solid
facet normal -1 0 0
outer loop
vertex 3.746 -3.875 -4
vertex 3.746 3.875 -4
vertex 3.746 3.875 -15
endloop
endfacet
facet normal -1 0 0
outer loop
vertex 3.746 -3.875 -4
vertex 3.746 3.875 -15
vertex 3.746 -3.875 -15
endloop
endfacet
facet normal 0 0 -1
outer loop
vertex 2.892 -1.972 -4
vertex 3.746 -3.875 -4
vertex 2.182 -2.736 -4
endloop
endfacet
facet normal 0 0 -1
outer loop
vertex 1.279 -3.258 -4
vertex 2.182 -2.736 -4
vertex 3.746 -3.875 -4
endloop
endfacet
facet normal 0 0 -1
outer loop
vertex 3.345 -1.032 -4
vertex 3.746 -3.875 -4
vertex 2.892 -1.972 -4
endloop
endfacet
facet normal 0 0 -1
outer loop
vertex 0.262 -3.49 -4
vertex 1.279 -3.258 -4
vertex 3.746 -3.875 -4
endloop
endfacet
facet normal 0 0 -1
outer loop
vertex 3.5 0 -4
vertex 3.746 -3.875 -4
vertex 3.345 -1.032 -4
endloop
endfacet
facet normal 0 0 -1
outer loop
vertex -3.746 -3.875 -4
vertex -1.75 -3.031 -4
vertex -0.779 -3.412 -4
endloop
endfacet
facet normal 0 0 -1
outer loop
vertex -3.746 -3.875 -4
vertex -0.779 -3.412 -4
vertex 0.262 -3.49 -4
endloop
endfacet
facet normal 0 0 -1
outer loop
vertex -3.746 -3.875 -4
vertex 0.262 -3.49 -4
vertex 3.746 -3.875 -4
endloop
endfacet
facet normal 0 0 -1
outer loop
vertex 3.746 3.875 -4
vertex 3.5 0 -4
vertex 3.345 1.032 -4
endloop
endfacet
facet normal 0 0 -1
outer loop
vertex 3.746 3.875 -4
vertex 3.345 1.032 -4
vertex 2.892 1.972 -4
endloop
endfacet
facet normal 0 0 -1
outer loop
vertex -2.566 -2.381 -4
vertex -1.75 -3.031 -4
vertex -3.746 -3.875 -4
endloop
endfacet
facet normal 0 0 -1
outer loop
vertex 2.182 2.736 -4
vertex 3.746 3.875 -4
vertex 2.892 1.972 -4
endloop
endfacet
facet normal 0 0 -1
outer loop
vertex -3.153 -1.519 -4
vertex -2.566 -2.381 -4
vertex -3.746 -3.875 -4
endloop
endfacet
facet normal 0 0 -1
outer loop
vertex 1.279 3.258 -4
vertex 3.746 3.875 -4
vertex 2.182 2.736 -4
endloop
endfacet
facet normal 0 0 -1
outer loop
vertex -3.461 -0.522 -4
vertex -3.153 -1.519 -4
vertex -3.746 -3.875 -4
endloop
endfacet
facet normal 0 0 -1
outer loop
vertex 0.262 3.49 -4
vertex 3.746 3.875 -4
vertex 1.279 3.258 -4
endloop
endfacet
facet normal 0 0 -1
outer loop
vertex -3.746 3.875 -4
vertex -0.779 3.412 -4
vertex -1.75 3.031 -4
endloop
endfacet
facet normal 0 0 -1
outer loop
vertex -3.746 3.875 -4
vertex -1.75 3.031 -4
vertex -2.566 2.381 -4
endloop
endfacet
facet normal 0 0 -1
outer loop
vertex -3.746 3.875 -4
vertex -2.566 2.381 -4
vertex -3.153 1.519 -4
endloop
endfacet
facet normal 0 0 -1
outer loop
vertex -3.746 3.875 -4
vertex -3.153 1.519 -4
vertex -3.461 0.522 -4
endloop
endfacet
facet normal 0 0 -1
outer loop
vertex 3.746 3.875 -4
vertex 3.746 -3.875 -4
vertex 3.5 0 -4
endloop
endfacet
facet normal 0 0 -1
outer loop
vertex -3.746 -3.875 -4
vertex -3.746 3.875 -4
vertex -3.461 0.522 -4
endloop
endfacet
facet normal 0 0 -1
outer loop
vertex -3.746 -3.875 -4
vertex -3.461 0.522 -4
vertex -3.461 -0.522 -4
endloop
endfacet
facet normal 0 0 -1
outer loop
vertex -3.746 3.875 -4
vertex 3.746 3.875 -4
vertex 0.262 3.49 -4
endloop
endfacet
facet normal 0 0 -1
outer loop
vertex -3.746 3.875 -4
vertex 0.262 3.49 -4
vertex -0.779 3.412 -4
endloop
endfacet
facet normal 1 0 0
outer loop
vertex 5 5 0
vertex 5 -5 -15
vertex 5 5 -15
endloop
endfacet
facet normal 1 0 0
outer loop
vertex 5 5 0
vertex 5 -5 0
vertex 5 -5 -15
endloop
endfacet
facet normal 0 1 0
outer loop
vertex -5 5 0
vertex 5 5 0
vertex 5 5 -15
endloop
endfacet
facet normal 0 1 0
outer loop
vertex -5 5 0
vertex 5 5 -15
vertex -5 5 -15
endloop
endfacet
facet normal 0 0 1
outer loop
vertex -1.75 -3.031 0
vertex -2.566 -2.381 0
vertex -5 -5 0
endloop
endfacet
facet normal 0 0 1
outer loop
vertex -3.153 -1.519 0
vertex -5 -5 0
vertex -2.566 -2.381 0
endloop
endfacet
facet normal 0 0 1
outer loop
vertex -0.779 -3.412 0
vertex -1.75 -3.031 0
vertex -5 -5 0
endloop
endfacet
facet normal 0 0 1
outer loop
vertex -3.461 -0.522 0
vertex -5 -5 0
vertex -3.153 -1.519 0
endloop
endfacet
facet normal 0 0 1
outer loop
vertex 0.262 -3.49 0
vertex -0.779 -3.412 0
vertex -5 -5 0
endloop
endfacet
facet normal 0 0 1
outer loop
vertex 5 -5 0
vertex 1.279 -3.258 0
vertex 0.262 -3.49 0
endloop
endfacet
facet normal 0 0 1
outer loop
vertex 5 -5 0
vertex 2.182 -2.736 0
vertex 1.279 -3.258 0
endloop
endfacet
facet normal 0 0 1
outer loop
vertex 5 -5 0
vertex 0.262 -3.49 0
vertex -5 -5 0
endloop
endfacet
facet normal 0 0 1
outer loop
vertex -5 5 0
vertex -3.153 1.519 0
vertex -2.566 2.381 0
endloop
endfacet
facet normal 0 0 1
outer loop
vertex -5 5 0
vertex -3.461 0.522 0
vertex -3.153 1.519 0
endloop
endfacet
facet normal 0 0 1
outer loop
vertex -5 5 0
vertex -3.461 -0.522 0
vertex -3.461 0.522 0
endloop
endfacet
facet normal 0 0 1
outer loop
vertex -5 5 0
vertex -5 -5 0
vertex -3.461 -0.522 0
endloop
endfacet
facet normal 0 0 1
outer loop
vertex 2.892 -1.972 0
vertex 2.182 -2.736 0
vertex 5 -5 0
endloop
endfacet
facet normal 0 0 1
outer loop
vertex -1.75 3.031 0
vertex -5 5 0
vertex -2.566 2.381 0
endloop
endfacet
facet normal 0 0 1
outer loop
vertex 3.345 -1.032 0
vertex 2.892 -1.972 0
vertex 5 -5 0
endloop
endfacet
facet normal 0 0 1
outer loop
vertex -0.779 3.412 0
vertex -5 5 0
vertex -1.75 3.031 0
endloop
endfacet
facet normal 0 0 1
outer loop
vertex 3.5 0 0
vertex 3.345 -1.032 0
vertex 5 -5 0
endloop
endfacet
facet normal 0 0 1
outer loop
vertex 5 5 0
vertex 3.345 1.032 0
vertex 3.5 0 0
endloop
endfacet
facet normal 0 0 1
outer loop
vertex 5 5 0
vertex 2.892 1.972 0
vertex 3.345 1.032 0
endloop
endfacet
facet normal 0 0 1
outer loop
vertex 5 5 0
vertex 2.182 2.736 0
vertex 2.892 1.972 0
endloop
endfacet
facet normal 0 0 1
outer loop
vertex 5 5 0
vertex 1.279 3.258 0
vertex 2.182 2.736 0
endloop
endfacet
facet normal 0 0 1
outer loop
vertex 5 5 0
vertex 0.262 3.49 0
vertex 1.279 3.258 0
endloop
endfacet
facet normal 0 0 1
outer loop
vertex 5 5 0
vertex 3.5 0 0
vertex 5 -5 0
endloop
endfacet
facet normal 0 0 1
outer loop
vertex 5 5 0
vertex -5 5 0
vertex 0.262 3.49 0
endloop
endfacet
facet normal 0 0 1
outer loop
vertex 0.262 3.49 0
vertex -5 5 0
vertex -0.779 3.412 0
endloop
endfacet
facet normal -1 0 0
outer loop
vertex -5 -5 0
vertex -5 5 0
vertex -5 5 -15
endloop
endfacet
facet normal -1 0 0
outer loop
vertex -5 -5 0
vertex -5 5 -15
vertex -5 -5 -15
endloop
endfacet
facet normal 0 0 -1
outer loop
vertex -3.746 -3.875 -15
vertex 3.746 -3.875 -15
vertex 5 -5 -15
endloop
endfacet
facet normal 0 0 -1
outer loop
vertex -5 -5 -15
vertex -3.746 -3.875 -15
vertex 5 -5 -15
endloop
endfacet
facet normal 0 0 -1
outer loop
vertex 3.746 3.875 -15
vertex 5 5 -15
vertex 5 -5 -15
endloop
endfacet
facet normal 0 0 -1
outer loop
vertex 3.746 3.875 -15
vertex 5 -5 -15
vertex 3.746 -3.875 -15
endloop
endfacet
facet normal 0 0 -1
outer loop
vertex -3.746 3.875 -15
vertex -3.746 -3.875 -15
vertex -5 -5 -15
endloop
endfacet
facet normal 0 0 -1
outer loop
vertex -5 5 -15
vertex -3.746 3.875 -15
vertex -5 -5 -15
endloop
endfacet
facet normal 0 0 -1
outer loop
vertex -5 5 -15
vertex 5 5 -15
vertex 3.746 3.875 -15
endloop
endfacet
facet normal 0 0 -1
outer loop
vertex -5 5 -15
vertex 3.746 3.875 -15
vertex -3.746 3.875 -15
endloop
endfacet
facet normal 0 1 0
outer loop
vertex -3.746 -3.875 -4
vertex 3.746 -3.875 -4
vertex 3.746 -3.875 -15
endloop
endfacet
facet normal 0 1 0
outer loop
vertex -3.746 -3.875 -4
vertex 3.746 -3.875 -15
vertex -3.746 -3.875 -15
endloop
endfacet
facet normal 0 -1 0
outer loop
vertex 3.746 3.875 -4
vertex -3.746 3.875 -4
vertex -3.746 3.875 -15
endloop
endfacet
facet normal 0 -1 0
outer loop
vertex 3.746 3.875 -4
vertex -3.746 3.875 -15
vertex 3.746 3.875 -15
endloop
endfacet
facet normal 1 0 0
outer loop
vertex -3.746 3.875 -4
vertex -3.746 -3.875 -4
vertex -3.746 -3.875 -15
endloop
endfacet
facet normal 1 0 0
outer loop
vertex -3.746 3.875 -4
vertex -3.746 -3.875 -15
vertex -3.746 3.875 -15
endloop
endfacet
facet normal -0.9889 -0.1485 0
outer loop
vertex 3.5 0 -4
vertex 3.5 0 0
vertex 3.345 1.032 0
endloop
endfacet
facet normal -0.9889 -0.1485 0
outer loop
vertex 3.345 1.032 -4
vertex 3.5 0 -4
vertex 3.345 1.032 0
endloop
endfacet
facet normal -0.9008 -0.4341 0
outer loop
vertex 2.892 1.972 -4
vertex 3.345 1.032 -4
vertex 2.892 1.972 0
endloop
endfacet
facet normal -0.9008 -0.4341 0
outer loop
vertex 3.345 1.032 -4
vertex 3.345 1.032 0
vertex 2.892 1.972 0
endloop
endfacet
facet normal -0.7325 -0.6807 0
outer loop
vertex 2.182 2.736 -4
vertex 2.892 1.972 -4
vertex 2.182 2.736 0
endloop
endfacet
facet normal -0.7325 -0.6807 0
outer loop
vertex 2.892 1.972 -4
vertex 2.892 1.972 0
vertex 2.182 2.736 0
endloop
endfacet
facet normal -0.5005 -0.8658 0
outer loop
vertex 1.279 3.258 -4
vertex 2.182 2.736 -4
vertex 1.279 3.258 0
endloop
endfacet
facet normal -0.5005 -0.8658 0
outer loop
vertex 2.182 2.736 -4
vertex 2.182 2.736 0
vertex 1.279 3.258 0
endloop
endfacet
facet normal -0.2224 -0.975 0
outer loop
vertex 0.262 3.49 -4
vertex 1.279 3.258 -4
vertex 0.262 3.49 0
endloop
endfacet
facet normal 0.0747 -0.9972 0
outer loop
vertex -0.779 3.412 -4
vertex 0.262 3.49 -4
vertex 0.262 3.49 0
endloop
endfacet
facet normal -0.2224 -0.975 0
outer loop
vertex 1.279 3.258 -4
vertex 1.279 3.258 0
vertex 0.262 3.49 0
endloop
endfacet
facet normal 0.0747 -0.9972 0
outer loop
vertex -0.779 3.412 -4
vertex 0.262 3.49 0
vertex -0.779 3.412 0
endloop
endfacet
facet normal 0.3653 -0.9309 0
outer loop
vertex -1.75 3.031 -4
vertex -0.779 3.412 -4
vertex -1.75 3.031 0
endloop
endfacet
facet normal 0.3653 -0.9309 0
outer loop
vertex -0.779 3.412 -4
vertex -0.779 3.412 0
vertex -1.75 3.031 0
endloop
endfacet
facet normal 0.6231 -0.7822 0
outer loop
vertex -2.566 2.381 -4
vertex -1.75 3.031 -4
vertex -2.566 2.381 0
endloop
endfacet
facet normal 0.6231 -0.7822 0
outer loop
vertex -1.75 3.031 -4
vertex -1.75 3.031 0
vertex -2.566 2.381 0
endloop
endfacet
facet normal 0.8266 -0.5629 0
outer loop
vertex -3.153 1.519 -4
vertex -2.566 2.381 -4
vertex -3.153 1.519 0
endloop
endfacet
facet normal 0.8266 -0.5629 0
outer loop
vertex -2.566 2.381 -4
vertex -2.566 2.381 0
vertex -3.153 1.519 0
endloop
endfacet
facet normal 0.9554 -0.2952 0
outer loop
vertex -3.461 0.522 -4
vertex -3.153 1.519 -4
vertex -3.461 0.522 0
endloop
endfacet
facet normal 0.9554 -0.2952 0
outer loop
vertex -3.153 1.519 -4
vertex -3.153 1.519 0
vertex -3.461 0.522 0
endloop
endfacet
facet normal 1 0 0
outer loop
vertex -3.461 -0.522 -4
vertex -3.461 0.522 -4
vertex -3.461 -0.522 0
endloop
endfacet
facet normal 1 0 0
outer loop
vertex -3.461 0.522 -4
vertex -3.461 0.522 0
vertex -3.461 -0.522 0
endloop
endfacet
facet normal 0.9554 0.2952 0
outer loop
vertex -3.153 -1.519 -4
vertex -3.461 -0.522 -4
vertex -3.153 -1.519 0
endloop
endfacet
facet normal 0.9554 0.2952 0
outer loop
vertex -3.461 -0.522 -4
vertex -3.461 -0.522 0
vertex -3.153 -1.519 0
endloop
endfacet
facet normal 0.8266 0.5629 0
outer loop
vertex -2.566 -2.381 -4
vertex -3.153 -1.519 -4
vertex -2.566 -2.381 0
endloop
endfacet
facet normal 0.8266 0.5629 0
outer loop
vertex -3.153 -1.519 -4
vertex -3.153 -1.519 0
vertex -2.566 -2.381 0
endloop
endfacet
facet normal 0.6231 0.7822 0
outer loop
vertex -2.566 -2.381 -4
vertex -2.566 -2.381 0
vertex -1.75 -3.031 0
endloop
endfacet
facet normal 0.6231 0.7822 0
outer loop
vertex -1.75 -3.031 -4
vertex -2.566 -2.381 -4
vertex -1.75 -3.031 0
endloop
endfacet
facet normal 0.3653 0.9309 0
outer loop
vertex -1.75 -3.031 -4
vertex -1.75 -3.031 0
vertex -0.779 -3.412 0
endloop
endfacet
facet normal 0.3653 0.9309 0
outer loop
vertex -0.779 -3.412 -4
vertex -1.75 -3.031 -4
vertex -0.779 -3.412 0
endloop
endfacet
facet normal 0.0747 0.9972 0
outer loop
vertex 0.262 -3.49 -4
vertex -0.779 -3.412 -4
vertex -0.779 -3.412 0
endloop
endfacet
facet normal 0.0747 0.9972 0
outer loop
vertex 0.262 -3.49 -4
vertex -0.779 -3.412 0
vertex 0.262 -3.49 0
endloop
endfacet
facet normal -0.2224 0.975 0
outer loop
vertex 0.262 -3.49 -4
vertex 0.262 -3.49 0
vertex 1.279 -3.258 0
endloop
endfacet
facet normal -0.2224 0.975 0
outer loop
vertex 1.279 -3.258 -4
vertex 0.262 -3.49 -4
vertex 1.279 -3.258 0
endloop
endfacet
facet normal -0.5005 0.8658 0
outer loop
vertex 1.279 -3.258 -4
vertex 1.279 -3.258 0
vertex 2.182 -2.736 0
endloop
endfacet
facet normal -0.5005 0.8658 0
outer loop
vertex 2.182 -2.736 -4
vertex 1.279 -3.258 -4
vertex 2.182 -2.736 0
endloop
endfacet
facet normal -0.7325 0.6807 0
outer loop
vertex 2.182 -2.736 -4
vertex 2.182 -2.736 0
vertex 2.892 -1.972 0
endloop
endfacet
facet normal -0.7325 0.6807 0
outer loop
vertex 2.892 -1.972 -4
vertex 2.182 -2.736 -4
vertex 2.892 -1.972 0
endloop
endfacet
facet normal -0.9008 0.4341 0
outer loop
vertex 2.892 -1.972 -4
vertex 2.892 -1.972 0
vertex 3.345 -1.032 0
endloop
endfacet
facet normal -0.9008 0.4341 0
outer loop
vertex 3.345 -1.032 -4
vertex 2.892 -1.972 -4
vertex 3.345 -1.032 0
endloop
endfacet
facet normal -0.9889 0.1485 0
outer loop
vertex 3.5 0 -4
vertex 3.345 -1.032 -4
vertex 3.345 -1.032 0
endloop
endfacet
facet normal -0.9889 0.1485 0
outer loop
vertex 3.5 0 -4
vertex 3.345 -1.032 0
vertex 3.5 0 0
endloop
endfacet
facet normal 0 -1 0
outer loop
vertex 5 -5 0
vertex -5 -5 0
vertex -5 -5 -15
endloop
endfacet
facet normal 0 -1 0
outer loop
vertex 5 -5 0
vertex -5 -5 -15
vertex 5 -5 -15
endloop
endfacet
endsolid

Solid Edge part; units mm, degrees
sketch "Sketch1" plane through (0, 0, 0) normal (0, 0, 1) x (1, 0, 0)
  line L0 (5, -5) -> (5, 5)
  line L1 (5, 5) -> (-5, 5)
  line L2 (-5, 5) -> (-5, -5)
  line L3 (-5, -5) -> (5, -5)
extrude "Protrusion1" add sketch "Sketch1" against normal blind 8
sketch "Sketch2" plane through (0, 0, 0) normal (0, 0, 1) x (1, 0, 0)
  circle A0 centre (0, 0) radius 3.5
extrude "ExtrudedCutout_1" cut sketch "Sketch2" along normal mid plane 71.7561
sketch "Sketch3" plane through (0, 0, -8) normal (0, 0, -1) x (1, 0, 0)
  line L0 (5, 5) -> (-5, 5)
  line L1 (-5, 5) -> (-5, -5)
  line L2 (-5, -5) -> (5, -5)
  line L3 (5, -5) -> (5, 5)
  line L4 (-3.7458, 3.875) -> (-3.7458, -3.875)
  line L5 (-3.7458, -3.875) -> (3.7458, -3.875)
  line L6 (3.7458, -3.875) -> (3.7458, 3.875)
  line L7 (3.7458, 3.875) -> (-3.7458, 3.875)
extrude "ExtrudedProtrusion_4" add sketch "Sketch3" along normal blind 7
sketch "Sketch4" plane through (0, 0, -8) normal (0, 0, -1) x (1, 0, 0)
  line L0 (3.7458, 3.875) -> (-3.7458, 3.875)
  line L1 (-3.7458, 3.875) -> (-3.7458, -3.875)
  line L2 (-3.7458, -3.875) -> (3.7458, -3.875)
  line L3 (3.7458, -3.875) -> (3.7458, 3.875)
extrude "Cutout1" cut sketch "Sketch4" along normal mid plane 8
